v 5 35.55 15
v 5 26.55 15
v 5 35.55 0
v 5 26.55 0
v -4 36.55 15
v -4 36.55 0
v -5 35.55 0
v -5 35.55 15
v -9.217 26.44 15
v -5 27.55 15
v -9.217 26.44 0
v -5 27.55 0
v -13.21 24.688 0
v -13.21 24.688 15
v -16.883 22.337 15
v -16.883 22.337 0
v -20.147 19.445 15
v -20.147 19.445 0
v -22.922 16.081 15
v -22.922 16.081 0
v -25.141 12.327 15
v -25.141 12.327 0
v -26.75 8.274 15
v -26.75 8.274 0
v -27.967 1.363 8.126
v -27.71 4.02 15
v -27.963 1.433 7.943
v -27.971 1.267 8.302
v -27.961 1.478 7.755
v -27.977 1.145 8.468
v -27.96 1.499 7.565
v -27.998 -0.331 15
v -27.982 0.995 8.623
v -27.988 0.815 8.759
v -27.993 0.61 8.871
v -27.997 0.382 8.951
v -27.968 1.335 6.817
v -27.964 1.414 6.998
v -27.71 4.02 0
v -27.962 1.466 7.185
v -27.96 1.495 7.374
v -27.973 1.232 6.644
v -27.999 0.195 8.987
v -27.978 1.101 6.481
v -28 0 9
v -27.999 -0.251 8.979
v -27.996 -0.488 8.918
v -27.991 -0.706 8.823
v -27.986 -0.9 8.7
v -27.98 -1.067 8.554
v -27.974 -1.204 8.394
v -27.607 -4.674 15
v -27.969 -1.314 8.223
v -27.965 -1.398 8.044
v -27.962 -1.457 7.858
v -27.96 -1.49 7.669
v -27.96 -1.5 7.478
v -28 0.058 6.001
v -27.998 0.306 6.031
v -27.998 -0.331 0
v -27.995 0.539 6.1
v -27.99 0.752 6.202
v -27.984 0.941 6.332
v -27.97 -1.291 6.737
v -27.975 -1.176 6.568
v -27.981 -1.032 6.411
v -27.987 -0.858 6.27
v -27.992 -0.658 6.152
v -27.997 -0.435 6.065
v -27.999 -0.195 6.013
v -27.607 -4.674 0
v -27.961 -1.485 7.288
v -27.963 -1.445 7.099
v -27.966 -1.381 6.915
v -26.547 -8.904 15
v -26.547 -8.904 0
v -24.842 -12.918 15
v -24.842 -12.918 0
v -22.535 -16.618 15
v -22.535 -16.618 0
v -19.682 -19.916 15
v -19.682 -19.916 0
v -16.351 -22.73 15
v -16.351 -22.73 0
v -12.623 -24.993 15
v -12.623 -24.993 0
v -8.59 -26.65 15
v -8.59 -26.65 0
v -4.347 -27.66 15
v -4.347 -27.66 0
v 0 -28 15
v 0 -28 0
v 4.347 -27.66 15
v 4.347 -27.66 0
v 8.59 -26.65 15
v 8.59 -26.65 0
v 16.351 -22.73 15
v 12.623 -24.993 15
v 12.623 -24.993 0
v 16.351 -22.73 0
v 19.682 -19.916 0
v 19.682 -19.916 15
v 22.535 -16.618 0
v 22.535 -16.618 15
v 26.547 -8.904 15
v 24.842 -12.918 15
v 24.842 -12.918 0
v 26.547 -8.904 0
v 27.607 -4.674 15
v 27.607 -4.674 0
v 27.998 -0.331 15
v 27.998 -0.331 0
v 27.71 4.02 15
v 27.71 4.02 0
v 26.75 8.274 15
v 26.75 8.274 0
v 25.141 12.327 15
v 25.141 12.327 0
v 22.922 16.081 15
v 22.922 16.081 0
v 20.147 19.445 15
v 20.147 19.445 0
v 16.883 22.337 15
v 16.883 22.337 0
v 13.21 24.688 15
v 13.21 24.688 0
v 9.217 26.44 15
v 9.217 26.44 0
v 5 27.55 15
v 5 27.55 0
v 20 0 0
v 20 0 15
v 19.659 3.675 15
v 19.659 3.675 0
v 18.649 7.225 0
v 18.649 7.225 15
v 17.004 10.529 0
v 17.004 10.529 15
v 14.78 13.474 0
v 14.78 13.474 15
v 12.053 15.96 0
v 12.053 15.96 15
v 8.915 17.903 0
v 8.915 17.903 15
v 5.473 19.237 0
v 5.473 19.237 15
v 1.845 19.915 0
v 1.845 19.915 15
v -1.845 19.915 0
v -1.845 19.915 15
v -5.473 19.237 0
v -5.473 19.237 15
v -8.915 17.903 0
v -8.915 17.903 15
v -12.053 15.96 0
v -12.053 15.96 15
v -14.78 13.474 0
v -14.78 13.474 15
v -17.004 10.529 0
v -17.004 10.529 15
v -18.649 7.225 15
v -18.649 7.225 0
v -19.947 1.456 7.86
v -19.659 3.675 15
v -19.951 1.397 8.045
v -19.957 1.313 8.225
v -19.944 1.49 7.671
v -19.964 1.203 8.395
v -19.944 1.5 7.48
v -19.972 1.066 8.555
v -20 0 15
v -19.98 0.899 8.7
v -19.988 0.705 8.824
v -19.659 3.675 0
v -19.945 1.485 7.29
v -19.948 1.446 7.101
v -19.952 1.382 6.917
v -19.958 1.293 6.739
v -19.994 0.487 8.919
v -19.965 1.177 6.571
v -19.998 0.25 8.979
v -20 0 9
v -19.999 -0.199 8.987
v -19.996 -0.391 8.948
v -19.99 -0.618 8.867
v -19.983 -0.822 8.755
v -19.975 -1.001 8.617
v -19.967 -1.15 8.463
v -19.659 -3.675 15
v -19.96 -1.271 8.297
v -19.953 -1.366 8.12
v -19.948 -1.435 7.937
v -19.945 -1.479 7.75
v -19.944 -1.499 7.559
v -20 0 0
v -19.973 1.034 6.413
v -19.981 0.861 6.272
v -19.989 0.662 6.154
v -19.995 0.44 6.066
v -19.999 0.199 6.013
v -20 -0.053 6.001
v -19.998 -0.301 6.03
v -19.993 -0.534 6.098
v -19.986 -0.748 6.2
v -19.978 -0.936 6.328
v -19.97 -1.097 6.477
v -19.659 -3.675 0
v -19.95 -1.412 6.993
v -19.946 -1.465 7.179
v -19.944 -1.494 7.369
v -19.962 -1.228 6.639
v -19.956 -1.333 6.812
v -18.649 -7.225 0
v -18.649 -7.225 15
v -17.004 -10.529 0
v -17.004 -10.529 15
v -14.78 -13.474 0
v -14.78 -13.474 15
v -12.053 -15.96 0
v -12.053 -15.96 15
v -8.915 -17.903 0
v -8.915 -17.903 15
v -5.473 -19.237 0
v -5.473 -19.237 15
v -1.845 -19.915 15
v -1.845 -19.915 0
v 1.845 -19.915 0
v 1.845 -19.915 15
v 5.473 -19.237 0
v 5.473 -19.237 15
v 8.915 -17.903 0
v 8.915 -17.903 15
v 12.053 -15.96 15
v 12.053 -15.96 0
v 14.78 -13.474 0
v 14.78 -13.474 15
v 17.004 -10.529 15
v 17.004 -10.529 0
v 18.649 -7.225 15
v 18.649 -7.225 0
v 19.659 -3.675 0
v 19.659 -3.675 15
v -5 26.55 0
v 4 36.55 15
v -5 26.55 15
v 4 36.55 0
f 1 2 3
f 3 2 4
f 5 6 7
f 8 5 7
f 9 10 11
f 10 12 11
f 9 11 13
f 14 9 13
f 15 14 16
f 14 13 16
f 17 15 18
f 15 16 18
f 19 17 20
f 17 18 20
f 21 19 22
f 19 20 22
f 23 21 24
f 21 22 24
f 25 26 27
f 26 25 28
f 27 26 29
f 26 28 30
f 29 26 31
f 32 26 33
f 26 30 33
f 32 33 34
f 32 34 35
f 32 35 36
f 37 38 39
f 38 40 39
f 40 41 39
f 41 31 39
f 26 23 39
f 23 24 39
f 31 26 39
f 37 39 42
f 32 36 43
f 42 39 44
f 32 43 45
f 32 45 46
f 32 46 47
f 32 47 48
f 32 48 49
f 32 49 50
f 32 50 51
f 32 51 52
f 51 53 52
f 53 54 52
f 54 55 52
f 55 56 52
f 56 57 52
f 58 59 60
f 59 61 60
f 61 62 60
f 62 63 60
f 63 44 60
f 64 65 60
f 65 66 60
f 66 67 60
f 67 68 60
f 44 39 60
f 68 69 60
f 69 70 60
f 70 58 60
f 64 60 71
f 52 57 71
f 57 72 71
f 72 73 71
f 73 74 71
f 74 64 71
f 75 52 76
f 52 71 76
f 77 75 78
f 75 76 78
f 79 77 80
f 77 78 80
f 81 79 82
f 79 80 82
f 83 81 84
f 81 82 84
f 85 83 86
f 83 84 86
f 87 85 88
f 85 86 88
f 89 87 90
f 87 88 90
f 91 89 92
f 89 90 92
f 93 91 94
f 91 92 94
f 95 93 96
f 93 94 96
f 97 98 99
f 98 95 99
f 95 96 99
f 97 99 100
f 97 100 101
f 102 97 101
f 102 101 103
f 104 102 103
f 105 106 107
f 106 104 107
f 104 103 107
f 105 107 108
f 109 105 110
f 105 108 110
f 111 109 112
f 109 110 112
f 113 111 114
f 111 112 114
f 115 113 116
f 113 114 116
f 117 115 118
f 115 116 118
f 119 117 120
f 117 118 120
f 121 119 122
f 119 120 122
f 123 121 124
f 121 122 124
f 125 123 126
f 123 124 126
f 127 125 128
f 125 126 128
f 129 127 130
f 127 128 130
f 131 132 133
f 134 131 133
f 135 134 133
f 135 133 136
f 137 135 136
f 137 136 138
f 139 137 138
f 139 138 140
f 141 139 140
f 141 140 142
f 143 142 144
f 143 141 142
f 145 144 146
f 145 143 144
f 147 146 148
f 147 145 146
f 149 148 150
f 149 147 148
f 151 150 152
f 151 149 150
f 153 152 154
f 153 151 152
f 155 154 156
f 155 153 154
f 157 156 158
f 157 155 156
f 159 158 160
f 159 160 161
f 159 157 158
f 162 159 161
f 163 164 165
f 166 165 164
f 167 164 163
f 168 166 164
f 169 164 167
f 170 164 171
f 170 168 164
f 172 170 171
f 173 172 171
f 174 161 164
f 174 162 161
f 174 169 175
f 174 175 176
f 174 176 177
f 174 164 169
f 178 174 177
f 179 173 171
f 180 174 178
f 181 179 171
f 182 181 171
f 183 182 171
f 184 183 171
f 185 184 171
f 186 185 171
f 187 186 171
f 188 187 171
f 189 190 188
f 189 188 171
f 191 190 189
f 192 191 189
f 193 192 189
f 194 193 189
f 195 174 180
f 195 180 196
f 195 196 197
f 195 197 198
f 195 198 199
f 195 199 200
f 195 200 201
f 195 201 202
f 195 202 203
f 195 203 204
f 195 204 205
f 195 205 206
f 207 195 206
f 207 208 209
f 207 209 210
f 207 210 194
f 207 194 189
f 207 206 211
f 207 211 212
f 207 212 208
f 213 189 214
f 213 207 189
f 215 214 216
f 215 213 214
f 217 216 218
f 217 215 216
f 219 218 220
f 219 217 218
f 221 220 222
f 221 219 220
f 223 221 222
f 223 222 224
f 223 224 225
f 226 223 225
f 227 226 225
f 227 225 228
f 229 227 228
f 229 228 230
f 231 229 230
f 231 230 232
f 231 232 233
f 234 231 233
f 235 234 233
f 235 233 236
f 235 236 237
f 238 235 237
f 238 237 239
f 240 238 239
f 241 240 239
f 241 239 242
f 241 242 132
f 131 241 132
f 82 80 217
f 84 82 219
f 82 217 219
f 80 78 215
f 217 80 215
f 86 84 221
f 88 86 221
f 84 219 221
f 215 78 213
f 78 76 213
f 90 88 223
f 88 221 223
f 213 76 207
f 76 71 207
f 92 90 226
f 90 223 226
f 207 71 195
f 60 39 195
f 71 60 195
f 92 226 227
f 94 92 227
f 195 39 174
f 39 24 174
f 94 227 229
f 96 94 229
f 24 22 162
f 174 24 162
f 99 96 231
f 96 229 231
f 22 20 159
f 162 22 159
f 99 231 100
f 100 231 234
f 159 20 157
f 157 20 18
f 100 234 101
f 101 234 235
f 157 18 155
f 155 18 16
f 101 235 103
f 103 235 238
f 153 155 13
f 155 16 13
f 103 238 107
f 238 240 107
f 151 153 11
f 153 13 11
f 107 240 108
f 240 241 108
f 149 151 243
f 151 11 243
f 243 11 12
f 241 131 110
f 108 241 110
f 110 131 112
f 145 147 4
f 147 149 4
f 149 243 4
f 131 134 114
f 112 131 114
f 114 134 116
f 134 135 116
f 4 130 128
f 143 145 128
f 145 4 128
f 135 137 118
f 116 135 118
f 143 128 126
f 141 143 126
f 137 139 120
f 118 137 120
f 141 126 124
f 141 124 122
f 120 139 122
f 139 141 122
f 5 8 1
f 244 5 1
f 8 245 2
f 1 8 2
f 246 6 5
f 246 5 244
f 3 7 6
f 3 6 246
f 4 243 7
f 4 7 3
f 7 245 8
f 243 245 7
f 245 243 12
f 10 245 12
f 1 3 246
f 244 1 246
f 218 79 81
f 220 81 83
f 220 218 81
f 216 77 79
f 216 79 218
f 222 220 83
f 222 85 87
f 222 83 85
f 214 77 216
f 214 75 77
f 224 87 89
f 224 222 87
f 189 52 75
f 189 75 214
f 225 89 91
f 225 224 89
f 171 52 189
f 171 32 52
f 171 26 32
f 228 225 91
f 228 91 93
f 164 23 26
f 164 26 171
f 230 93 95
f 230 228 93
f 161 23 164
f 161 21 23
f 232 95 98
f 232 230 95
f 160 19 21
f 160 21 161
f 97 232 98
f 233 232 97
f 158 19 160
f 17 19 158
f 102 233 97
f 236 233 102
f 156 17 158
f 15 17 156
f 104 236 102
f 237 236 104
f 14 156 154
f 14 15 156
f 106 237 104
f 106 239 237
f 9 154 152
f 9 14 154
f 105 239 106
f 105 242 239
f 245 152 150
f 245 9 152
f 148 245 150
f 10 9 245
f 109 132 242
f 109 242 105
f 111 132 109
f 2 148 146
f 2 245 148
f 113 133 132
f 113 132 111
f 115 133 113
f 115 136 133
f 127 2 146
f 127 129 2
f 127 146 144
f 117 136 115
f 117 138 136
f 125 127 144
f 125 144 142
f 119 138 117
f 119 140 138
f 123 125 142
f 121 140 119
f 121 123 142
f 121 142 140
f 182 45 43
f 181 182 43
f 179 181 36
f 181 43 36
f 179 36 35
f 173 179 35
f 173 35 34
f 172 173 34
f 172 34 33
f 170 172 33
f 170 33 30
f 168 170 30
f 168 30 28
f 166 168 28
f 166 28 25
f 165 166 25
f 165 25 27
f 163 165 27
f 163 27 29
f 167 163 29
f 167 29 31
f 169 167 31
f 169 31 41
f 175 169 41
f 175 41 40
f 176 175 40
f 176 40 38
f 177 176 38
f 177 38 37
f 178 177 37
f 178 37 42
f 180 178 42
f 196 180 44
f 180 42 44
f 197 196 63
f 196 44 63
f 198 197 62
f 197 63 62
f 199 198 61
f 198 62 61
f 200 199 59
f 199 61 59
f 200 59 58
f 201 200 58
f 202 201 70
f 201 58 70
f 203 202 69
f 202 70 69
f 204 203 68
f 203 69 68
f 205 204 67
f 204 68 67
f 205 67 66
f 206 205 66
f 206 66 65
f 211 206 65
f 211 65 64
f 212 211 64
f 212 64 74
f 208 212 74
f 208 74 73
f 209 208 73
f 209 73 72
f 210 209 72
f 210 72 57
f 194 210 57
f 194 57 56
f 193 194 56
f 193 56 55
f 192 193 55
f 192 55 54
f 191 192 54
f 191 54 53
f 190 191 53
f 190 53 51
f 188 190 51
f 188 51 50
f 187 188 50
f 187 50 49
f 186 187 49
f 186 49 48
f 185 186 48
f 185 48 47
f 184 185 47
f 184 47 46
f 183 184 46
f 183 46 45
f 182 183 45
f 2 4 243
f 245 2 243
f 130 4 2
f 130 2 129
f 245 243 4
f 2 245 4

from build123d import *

# Parameters (mm, degrees)
SKETCH1_R               = 28
SKETCH1_R_2             = 20
BOSS_EXTRUDE1_DEPTH     = 15
CUT_EXTRUDE1_REACH      = 66.382
CUT_EXTRUDE1_END_RADIUS = 20
SKETCH2_R               = 1.5
SKETCH3_W               = 5
SKETCH3_H               = 1
CUT_EXTRUDE2_DEPTH      = 15
SKETCH5_W               = 10
SKETCH5_H               = 15
BOSS_EXTRUDE2_DEPTH     = 10
CUT_EXTRUDE3_DEPTH      = 15


with BuildPart() as part:
    # Sketch1 → Boss-Extrude1 (new body)
    with BuildSketch(Plane.XY):
        Circle(SKETCH1_R)
        Circle(SKETCH1_R_2, mode=Mode.SUBTRACT)
    extrude(amount=BOSS_EXTRUDE1_DEPTH)

    # Cut-Extrude1: up to this cylinder (the profile starts outside it)
    cut_extrude1_end = Plane(origin=(0, 0, 7.5), z_dir=(0, 0, -1)) * Cylinder(CUT_EXTRUDE1_END_RADIUS, 173.764, mode=Mode.PRIVATE)
    # Sketch2 → Cut-Extrude1 (cut, up to the surface)
    with BuildSketch(Plane.ZY.offset(28), mode=Mode.PRIVATE) as cut_extrude1_sk1:
        with Locations((7.5, 0)):
            Circle(SKETCH2_R)
    cut_extrude1_tool1 = extrude(cut_extrude1_sk1.sketch, amount=-CUT_EXTRUDE1_REACH, mode=Mode.PRIVATE) - cut_extrude1_end
    add(cut_extrude1_tool1.solids().sort_by_distance((-28, 0, 7.5))[0], mode=Mode.SUBTRACT)

    # Sketch3 → Cut-Extrude2 (cut)
    with BuildSketch(Plane(origin=(0, 0, 0), x_dir=(-1, 0, 0), z_dir=(0, 0, -1))):
        with BuildLine():
            Line((-5, 27.549954628), (0, 27.549954628))
            Line((0, 27.549954628), (0, 28))
            ThreePointArc((0, 28), (-2.510106613, 27.887261694), (-5, 27.549954628))
        make_face()
        with BuildLine():
            Line((0, 28), (0, 27.549954628))
            Line((0, 27.549954628), (5, 27.549954628))
            ThreePointArc((5, 27.549954628), (2.510106613, 27.887261694), (0, 28))
        make_face()
        with Locations((-2.5, 27.049954628)):
            Rectangle(SKETCH3_W, SKETCH3_H)
        with Locations((2.5, 27.049954628)):
            Rectangle(SKETCH3_W, SKETCH3_H)
    extrude(amount=-CUT_EXTRUDE2_DEPTH, mode=Mode.SUBTRACT)


with BuildPart() as body_2:
    # Sketch5 → Boss-Extrude2 (new body)
    with BuildSketch(Plane(origin=(0, 26.549954628, 0), x_dir=(1, 0, 0), z_dir=(0, 1, 0))):
        with Locations((0, -7.5)):
            Rectangle(SKETCH5_W, SKETCH5_H)
    extrude(amount=BOSS_EXTRUDE2_DEPTH)

    # Sketch6 → Cut-Extrude3 (cut)
    with BuildSketch(Plane(origin=(0, 0, 0), x_dir=(-1, 0, 0), z_dir=(0, 0, -1))):
        Polygon((-5, 36.549954628), (-5, 35.549954628), (-4, 36.549954628), align=None)
        Polygon((5, 36.549954628), (4, 36.549954628), (5, 35.549954628), align=None)
    extrude(amount=-CUT_EXTRUDE3_DEPTH, mode=Mode.SUBTRACT)


solid = Compound([part.part, body_2.part])
